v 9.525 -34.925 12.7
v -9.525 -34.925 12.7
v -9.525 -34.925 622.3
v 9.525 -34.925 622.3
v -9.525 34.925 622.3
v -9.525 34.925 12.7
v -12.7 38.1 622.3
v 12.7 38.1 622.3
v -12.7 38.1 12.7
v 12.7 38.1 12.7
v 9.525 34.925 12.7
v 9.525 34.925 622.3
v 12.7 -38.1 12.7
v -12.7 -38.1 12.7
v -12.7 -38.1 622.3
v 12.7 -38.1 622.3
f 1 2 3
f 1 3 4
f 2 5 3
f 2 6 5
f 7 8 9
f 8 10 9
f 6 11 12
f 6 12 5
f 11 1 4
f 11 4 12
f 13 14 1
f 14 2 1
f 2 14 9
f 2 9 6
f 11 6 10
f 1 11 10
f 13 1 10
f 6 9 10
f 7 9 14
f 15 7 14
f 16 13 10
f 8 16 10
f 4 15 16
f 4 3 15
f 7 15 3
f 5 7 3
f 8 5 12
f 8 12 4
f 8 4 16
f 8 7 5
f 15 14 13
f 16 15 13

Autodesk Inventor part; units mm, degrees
ref_plane "Start Plane" through (0, 0, 12.7) normal (0, 0, 1) x (1, 0, 0)
ref_plane "End Plane" through (0, 0, 622.3) normal (0, 0, 1) x (1, 0, 0)
sketch "Sketch" plane through (0, 0, 0) normal (0, 0, 1) x (1, 0, 0)
  line L0 (-12.7, -38.1) -> (12.7, -38.1)
  line L1 (12.7, -38.1) -> (12.7, 38.1)
  line L2 (12.7, 38.1) -> (-12.7, 38.1)
  line L3 (-12.7, 38.1) -> (-12.7, -38.1)
  line L4 (-12.7, -38.1) -> (12.7, 38.1) construction
  line L5 (12.7, -38.1) -> (-12.7, 38.1) construction
  line L6 (-9.525, -34.925) -> (9.525, -34.925)
  line L7 (9.525, -34.925) -> (9.525, 34.925)
  line L8 (9.525, 34.925) -> (-9.525, 34.925)
  line L9 (-9.525, 34.925) -> (-9.525, -34.925)
  line L10 (-9.525, -34.925) -> (9.525, 34.925) construction
  line L11 (9.525, -34.925) -> (-9.525, 34.925) construction
  point P0 (0, 0)
  dimension "d0" = 25.4
  dimension "d1" = 76.2
  dimension "d2" = 3.175
  dimension "d3" = 3.175
extrude "Body" add sketch "Sketch" along normal up to surface (609.6 mm away) from surface at 12.7
sketch "Sketch6" plane through (0, 0, 0) normal (0, 0, 1) x (1, 0, 0)
  line L0 (0, 0) -> (10, 0)
ref_plane "Work Plane5" through (0, 0, 0) normal (0, -1, 0) x (1, 0, 0)
sketch "Sketch7" plane through (0, 0, 0) normal (0, -1, 0) x (1, 0, 0)
  line L0 (-2, 12.7) -> (12, 12.7)
  line L1 (-2, 622.3) -> (12, 622.3)
  dimension "d11" = 609.6
ref_plane "Work Plane6" through (0, -38.1, 622.3) normal (0, 0, 1) x (1, 0, 0)
split "Split1" plane through (0, -38.1, 622.3) removes the side toward (0, 0, 1)
ref_plane "Work Plane7" through (711.2, -38.1, 12.7) normal (0, 0, -1) x (-1, 0, 0)
split "Split2" plane through (711.2, -38.1, 12.7) removes the side toward (0, 0, -1)
equation "\"d0\" = Width"
equation "\"d1\" = Height"
equation "\"d2\" = Thickness"
equation "\"d3\" = Thickness"
equation "\"Height\" = 76.2"
equation "\"Width\" = 25.4"
equation "\"Thickness\" = 3.175"
equation "\"BaseLength\" = 635"
equation "\"G_OFFSET_START\" = -12.7"
equation "\"G_OFFSET_END\" = -12.7"
equation "\"d6\" = -G_OFFSET_START"
equation "\"d7\" = BaseLength + G_OFFSET_END"
equation "\"G_L\" = d11"
properties part number "AL RECT TUBE 3 x 1 x 0.125" material "Aluminum 6061"
